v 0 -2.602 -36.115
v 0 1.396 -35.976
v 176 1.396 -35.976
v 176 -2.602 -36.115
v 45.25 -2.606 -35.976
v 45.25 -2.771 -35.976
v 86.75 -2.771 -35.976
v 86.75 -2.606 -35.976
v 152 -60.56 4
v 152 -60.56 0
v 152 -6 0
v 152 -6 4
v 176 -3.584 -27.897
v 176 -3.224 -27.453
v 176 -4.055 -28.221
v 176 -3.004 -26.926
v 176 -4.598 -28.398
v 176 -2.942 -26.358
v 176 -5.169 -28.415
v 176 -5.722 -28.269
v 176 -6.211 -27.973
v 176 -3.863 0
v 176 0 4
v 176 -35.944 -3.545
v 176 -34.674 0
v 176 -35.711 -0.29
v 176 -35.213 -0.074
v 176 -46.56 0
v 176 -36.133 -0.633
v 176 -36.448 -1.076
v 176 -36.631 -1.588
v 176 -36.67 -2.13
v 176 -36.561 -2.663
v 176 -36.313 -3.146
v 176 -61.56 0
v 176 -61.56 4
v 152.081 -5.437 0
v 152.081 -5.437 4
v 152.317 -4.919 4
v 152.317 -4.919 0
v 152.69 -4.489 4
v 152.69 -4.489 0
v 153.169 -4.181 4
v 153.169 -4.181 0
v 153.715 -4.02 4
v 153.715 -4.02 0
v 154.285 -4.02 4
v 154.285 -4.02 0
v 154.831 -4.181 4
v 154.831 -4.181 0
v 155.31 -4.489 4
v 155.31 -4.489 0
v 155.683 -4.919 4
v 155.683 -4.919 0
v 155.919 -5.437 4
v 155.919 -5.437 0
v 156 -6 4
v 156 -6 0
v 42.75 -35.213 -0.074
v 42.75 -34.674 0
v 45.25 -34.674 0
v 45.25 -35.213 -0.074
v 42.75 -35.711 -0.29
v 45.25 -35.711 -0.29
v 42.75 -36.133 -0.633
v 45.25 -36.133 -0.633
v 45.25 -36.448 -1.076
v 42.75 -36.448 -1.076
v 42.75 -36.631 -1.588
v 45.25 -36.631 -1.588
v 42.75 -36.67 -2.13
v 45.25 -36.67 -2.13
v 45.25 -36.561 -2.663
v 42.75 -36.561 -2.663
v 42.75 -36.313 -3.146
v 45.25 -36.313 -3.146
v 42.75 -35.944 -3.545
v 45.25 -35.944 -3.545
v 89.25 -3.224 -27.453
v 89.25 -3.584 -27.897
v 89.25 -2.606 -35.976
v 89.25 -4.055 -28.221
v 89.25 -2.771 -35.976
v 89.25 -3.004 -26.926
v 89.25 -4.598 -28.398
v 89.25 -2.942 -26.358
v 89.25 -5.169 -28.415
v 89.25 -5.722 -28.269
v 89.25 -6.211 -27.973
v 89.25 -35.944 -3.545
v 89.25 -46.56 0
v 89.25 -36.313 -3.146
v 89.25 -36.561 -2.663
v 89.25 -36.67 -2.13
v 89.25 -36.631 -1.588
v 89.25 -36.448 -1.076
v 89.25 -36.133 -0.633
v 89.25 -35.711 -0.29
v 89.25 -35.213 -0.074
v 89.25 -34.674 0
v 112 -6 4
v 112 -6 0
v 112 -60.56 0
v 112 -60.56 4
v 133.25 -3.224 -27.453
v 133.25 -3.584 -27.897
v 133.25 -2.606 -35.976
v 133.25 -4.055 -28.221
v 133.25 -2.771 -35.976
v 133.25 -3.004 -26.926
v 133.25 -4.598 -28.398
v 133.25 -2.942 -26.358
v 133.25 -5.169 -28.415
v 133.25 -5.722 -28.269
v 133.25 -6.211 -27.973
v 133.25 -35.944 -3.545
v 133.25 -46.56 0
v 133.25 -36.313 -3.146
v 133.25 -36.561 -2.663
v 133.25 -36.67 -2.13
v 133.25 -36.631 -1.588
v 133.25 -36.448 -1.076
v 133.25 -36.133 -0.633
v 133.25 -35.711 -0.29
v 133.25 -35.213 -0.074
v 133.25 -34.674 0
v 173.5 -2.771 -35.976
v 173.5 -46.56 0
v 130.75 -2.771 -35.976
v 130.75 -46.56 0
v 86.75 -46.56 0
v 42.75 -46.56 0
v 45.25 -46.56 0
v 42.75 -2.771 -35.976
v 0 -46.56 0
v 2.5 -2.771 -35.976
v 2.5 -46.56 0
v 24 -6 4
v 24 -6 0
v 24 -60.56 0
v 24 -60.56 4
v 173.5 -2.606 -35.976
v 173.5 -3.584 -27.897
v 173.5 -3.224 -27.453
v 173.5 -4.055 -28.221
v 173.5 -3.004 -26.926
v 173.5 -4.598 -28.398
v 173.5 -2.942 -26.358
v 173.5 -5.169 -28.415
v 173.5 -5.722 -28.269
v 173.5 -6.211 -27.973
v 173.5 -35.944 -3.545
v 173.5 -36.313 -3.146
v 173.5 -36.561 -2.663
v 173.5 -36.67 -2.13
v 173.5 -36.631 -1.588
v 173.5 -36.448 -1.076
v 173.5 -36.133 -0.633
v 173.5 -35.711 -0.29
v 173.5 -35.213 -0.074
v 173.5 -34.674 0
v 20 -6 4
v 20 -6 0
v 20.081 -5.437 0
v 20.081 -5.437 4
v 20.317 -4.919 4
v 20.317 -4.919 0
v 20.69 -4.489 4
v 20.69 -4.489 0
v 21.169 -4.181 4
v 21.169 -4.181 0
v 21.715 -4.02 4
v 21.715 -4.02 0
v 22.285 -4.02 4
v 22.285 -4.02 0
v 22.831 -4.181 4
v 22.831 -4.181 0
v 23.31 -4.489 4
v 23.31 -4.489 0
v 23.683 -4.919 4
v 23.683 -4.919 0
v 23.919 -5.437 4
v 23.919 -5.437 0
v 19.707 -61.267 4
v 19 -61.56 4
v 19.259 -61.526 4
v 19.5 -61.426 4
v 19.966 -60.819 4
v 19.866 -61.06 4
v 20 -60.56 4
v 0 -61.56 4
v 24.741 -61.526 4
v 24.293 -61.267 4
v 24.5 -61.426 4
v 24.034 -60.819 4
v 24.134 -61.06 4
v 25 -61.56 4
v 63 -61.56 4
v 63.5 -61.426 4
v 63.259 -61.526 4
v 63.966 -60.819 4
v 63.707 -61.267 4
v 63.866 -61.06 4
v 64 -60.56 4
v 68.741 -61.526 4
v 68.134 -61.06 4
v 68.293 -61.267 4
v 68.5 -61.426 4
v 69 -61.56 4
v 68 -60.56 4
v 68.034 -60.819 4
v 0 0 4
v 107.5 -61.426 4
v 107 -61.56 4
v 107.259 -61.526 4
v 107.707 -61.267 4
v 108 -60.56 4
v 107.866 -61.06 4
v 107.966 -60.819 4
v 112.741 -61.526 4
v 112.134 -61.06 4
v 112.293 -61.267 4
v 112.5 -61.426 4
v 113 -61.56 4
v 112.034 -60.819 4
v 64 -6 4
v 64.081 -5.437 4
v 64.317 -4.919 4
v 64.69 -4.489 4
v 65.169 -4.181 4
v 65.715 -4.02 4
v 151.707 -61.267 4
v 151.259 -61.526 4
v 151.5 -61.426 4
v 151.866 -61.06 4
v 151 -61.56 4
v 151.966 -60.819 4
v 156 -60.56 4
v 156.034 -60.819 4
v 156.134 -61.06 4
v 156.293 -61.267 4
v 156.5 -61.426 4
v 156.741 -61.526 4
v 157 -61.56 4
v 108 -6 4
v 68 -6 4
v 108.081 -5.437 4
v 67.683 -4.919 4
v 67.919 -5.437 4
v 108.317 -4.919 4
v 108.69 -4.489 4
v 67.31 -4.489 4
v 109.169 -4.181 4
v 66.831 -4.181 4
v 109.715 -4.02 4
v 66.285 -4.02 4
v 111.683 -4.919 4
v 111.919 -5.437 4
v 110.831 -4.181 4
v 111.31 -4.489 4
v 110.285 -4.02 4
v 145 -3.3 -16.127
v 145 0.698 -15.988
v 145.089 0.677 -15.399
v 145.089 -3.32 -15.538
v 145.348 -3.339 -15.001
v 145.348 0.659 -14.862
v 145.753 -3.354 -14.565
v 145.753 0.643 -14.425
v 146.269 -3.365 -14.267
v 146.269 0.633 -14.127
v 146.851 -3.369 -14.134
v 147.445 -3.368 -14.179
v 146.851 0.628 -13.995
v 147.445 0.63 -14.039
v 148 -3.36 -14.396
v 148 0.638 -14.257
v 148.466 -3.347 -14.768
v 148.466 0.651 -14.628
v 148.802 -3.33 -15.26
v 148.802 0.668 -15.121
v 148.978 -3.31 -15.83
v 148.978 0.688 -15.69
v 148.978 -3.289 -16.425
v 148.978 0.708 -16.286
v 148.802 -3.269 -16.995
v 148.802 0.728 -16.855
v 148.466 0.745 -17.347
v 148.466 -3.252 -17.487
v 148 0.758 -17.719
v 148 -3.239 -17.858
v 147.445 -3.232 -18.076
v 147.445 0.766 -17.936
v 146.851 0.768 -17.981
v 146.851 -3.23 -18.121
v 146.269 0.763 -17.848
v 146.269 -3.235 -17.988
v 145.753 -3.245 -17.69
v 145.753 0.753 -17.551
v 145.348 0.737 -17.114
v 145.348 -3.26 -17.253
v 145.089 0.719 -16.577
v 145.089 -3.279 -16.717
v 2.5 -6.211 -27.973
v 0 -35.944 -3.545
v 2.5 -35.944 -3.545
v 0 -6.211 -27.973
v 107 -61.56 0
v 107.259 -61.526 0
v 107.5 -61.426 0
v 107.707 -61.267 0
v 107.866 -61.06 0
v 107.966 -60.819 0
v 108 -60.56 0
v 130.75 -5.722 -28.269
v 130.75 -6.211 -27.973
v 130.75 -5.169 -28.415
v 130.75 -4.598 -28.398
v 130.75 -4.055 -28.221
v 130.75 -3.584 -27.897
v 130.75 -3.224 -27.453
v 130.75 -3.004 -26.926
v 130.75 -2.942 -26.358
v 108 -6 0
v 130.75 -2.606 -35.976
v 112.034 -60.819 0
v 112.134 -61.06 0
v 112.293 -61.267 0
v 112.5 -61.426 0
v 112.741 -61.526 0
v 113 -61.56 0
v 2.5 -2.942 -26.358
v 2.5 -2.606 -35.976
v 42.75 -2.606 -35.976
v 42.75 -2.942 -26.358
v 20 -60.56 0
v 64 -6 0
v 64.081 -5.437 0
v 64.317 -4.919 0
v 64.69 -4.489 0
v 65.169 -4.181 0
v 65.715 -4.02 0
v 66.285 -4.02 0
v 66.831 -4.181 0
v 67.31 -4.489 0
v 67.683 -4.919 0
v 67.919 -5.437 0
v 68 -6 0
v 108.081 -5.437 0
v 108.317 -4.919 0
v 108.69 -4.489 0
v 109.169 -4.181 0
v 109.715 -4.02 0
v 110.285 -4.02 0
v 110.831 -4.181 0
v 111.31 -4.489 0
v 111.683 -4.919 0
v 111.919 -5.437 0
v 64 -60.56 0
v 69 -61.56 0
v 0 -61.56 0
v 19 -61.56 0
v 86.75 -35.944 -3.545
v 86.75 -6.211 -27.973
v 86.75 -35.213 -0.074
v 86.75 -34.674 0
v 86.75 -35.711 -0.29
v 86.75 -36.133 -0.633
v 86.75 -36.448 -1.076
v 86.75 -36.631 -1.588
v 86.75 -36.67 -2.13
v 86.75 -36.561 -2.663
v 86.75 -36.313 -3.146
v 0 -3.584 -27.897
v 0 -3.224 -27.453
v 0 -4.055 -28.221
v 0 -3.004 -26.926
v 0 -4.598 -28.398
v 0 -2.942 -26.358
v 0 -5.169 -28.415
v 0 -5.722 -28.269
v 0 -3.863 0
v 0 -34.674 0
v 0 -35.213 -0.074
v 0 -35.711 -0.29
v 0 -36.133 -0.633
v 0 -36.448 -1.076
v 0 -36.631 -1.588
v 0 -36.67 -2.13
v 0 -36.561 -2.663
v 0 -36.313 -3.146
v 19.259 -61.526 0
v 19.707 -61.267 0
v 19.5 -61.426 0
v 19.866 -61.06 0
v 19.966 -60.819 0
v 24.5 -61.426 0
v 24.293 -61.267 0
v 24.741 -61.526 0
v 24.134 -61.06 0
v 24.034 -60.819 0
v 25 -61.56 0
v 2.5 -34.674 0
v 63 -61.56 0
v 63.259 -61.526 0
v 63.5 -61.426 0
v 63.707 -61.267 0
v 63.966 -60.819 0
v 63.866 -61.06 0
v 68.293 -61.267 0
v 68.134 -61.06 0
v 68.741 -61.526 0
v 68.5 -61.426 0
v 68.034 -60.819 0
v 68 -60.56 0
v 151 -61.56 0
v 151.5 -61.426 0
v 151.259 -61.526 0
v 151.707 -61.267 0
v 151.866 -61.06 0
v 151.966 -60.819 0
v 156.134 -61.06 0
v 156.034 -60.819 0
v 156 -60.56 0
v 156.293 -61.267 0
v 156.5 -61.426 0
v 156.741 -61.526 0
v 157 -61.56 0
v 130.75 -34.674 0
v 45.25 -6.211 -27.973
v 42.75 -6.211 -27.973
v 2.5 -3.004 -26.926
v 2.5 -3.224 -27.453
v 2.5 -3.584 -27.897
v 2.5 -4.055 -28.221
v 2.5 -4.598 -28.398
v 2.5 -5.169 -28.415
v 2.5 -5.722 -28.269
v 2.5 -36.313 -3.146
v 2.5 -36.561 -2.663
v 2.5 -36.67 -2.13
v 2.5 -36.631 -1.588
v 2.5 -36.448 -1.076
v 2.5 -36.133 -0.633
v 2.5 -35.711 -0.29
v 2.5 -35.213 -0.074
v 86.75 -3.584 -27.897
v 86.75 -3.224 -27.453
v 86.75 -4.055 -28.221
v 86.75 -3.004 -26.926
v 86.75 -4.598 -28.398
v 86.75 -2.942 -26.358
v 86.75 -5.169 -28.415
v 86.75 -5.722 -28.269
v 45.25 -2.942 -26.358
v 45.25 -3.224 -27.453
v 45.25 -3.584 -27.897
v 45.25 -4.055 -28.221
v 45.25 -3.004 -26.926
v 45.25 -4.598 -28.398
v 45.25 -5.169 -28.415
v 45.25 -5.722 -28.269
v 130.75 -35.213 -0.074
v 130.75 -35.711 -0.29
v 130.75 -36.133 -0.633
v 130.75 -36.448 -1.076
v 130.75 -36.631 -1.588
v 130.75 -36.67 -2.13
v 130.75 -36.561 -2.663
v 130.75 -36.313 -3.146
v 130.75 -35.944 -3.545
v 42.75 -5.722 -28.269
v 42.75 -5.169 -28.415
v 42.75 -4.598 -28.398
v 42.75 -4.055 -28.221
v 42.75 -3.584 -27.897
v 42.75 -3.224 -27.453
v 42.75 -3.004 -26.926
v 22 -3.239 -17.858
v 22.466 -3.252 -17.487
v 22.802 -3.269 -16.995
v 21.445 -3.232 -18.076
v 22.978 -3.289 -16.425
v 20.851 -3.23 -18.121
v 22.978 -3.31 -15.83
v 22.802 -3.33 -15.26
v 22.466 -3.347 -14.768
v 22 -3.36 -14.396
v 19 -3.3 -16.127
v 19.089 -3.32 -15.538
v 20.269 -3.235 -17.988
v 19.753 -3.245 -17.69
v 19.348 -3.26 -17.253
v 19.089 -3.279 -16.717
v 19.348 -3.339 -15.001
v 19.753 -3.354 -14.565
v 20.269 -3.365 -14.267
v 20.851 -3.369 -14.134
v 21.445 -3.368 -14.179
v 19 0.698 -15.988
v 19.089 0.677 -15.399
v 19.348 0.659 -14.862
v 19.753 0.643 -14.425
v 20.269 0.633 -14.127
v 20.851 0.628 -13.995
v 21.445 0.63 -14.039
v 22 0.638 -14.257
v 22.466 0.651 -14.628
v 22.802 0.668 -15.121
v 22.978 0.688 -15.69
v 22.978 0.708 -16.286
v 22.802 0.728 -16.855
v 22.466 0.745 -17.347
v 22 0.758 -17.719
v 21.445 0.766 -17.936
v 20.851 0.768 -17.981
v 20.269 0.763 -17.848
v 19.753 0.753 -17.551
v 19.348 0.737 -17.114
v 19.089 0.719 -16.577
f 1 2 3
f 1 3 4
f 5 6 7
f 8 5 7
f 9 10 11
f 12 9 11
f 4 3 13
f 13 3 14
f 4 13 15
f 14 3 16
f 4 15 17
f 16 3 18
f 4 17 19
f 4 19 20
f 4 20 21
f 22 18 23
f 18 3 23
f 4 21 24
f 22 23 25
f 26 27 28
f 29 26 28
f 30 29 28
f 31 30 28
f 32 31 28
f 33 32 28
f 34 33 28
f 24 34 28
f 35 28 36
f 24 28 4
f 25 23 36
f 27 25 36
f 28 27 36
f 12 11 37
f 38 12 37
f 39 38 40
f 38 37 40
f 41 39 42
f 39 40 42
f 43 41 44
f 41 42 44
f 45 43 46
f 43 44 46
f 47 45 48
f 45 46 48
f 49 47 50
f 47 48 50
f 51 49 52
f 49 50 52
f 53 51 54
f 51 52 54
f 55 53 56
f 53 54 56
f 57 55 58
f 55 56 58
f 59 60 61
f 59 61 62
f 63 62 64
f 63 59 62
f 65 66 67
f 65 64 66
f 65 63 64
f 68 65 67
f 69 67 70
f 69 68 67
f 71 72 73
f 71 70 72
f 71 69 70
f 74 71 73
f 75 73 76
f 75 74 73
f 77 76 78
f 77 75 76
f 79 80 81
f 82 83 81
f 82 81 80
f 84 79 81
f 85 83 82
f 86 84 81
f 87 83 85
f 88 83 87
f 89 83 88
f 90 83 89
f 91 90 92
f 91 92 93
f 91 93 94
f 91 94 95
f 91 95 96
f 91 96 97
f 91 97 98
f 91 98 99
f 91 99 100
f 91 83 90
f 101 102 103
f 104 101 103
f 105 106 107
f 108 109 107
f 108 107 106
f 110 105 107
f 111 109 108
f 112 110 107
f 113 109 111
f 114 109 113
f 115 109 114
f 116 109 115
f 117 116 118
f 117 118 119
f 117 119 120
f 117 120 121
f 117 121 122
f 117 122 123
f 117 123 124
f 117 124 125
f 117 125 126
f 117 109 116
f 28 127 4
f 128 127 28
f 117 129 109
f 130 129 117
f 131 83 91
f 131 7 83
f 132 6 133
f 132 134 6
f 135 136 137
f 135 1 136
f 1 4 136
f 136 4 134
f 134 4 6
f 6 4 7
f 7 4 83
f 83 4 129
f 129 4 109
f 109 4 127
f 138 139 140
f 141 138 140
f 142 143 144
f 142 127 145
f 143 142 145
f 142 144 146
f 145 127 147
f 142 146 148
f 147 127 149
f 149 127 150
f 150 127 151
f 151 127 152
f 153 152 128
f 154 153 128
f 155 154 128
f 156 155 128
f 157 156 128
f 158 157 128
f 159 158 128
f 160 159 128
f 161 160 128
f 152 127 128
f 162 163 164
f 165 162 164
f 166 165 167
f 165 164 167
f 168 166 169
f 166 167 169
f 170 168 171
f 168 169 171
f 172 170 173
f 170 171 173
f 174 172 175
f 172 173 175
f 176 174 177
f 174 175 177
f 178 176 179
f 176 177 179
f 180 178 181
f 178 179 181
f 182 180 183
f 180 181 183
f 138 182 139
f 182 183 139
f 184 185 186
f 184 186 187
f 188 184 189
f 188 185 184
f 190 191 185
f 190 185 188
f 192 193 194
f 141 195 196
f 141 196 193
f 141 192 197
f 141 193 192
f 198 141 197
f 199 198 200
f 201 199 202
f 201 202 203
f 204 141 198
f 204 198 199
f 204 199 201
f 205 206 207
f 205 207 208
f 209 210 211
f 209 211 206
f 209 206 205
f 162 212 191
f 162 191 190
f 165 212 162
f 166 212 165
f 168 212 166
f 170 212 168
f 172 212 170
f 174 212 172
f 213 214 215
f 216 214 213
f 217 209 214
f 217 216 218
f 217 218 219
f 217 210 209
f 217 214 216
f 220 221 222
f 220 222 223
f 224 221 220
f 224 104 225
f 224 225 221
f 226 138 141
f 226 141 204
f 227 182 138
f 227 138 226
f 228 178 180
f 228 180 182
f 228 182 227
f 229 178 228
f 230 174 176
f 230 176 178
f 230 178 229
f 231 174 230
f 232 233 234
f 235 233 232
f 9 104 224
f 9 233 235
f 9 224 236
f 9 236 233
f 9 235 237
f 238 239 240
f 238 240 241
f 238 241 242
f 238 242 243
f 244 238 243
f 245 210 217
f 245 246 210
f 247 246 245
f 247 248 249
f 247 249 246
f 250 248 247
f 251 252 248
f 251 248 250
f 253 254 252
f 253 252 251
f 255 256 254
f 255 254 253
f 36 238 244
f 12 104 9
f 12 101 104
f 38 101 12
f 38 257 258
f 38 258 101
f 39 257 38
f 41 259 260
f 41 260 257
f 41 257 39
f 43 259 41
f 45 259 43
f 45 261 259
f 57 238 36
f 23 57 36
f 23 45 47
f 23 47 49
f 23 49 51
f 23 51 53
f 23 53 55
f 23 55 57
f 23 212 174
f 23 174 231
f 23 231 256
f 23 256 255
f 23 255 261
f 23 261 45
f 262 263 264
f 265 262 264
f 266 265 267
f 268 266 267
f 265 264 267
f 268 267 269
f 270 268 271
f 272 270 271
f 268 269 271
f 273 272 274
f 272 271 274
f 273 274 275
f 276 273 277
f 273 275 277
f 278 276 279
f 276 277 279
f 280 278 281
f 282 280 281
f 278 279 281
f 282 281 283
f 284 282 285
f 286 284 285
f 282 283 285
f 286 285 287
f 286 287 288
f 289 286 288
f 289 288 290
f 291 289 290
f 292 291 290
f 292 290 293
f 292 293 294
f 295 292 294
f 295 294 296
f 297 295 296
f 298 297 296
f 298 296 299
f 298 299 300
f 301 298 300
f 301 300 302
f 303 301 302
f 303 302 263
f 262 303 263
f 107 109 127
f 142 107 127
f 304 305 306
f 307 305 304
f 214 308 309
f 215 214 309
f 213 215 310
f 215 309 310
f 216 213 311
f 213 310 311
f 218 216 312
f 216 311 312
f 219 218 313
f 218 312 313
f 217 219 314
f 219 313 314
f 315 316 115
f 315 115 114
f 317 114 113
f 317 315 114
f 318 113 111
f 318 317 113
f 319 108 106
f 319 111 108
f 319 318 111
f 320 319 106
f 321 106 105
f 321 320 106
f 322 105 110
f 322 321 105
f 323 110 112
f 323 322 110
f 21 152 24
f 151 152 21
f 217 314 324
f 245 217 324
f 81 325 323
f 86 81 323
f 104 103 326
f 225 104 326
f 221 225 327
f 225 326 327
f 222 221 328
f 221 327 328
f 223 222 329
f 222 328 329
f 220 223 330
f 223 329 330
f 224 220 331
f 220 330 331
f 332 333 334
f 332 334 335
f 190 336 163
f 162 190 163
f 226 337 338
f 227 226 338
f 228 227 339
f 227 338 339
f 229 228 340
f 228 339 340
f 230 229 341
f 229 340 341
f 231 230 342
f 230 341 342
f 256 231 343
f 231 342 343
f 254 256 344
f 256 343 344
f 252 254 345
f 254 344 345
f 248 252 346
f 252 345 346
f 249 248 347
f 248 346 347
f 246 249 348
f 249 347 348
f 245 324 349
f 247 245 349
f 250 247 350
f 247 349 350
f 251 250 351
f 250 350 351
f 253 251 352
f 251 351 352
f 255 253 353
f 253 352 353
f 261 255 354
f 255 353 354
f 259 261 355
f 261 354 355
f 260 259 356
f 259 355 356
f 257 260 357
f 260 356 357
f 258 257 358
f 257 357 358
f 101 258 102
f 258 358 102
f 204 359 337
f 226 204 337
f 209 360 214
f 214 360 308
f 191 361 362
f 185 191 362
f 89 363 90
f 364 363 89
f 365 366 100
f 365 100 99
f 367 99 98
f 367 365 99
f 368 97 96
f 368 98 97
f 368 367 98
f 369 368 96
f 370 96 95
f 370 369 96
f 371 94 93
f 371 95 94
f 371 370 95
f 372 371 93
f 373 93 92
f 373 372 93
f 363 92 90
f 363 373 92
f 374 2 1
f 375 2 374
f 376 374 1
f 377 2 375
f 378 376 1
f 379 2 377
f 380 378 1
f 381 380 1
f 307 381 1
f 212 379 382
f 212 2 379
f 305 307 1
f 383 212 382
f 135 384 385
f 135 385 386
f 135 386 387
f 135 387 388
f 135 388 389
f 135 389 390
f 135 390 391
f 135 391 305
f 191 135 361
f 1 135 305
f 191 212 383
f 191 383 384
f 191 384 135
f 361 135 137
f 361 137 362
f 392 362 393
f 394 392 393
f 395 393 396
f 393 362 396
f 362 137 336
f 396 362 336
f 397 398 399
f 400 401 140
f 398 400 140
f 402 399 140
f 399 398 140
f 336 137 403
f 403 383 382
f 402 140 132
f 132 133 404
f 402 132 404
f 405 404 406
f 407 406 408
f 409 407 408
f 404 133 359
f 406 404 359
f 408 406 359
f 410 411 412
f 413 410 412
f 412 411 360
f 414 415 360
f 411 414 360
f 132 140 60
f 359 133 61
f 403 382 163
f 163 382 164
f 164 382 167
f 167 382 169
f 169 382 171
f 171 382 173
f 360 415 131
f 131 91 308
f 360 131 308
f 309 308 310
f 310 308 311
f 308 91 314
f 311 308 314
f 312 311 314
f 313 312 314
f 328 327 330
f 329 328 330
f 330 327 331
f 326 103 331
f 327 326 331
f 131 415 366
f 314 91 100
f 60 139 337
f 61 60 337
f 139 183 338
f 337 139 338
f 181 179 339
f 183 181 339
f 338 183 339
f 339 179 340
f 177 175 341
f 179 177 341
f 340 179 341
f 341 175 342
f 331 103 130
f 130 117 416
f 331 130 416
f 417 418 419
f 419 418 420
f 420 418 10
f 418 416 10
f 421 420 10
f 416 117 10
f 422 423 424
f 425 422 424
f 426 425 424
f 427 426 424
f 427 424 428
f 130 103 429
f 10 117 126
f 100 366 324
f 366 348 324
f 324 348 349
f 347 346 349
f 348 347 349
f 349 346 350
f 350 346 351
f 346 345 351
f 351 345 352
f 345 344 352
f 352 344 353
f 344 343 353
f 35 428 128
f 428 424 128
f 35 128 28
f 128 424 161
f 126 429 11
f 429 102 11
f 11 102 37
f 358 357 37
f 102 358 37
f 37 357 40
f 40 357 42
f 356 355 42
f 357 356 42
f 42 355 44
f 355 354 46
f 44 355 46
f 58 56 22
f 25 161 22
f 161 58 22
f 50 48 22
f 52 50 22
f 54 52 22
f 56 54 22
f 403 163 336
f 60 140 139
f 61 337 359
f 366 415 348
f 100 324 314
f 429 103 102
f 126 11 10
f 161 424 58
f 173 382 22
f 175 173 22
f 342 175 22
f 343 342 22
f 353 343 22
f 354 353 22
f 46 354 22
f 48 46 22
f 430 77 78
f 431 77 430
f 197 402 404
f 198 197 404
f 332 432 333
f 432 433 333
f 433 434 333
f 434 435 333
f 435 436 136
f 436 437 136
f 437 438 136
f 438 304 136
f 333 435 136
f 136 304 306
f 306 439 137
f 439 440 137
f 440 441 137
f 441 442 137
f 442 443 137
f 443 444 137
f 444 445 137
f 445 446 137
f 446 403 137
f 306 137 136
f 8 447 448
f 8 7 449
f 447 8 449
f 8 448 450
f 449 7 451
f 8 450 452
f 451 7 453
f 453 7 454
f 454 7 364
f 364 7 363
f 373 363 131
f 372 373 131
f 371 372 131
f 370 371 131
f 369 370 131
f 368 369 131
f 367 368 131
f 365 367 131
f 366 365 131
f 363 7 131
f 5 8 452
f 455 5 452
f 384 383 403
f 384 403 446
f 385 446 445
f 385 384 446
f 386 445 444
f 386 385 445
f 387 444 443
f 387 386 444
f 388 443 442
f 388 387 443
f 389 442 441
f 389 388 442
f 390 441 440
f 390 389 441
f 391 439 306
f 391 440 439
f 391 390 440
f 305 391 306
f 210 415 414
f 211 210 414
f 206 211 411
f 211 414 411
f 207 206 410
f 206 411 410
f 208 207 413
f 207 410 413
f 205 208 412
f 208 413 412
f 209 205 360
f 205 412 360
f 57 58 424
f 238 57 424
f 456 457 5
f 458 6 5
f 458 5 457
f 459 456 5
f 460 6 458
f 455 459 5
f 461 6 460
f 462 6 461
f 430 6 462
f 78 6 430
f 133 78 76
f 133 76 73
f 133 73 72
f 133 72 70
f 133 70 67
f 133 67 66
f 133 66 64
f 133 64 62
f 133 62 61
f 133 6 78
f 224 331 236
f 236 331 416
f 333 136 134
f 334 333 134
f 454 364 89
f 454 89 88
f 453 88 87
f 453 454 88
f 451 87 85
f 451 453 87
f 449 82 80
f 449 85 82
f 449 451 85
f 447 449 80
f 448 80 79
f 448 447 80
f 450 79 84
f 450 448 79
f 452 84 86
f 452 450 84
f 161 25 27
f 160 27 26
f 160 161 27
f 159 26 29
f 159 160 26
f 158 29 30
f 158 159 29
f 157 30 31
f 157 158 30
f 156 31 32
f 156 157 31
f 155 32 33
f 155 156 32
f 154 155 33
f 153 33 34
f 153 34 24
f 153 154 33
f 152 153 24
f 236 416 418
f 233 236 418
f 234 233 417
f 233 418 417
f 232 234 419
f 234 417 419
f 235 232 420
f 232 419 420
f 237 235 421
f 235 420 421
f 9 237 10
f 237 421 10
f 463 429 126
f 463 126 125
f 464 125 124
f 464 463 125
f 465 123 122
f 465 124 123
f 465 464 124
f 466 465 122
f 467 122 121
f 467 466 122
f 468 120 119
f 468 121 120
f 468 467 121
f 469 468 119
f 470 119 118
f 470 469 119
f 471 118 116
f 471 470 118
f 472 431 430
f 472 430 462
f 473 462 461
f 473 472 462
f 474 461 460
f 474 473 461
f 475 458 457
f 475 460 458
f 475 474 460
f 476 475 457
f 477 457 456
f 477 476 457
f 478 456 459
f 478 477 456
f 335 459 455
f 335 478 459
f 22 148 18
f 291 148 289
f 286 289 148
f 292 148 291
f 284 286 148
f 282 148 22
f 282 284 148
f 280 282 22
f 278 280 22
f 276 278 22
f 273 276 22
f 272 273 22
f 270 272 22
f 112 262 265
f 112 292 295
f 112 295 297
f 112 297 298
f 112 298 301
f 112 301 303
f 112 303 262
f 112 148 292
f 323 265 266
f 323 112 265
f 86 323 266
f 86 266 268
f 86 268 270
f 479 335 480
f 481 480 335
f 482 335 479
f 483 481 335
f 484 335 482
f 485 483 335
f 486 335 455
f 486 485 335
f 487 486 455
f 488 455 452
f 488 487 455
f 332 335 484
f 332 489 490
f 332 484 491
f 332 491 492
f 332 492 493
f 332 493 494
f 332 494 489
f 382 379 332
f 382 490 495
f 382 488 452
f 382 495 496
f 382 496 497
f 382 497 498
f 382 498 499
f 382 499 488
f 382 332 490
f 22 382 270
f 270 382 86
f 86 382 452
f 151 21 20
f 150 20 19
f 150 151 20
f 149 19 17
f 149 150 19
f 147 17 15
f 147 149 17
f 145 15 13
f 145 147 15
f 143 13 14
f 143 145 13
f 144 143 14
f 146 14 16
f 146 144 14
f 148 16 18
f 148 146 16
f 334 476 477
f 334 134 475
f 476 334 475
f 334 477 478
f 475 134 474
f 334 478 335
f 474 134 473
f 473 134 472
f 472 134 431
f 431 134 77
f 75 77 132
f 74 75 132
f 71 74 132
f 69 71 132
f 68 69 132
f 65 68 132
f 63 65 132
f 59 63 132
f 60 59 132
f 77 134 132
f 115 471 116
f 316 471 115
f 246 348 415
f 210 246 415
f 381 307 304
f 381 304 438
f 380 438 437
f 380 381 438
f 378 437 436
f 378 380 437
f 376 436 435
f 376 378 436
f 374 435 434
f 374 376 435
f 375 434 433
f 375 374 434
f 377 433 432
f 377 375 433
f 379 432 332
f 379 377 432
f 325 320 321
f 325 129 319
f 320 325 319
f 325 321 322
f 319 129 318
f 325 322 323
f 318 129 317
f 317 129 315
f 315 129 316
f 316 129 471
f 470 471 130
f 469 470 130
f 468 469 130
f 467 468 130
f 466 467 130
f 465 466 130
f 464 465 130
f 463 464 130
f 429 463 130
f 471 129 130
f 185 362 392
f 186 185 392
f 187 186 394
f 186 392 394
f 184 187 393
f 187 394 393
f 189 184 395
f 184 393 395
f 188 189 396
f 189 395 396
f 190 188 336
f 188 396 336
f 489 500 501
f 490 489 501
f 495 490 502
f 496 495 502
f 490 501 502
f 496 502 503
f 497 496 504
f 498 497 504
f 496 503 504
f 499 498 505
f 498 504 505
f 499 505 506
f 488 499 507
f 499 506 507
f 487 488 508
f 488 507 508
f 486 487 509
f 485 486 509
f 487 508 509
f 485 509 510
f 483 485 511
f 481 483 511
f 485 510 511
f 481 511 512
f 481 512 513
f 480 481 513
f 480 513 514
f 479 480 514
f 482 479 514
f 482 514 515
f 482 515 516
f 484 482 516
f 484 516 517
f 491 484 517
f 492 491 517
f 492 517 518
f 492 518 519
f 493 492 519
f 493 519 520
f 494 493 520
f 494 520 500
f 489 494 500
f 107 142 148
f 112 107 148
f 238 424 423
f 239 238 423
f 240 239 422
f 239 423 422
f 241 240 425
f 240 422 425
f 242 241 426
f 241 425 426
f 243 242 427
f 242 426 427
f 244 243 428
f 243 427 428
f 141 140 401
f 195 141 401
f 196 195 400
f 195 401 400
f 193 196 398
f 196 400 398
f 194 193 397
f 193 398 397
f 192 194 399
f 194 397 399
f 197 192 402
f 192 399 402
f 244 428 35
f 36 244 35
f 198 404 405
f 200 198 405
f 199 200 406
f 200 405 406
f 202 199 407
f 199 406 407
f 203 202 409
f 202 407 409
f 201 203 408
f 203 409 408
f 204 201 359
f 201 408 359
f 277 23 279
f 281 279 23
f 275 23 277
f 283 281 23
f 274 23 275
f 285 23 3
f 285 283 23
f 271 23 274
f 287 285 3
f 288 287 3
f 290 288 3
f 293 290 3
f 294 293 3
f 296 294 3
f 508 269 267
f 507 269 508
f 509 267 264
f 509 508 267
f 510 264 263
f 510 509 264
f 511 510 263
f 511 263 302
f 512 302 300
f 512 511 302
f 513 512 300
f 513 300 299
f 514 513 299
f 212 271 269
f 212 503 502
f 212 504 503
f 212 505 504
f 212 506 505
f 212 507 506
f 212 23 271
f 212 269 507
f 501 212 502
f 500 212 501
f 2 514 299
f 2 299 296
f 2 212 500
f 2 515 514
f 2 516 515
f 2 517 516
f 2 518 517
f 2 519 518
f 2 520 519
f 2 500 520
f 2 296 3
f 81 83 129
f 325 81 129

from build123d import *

# Parameters (mm, degrees)
F1_DEPTH = 4
F4_DEPTH = 176
F6_W     = 40.25
F6_H     = 35.9756330808
F6_W_2   = 41.5
F7_REACH = 113.8761797882
F8_R     = 2
F9_DEPTH = 25


# Not quite as in the source:
# - a feature names something its author has since deleted; it is built from what else it names


with BuildPart() as f1:
    # F0 (on Top) → F1 (new body)
    with BuildSketch(Plane.XY):
        with BuildLine():
            Line((176, 0), (0, 0))
            Line((0, 0), (0, -61.56))
            Line((0, -61.56), (19, -61.56))
            ThreePointArc((19, -61.56), (19.7071067812, -61.2671067812), (20, -60.56))
            Line((20, -60.56), (20, -6))
            ThreePointArc((20, -6), (22, -4), (24, -6))
            Line((24, -6), (24, -60.56))
            ThreePointArc((24, -60.56), (24.2928932188, -61.2671067812), (25, -61.56))
            Line((25, -61.56), (63, -61.56))
            ThreePointArc((63, -61.56), (63.7071067812, -61.2671067812), (64, -60.56))
            Line((64, -60.56), (64, -6))
            ThreePointArc((64, -6), (66, -4), (68, -6))
            Line((68, -6), (68, -60.56))
            ThreePointArc((68, -60.56), (68.2928932188, -61.2671067812), (69, -61.56))
            Line((69, -61.56), (107, -61.56))
            ThreePointArc((107, -61.56), (107.7071067812, -61.2671067812), (108, -60.56))
            Line((108, -60.56), (108, -6))
            ThreePointArc((108, -6), (110, -4), (112, -6))
            Line((112, -6), (112, -60.56))
            ThreePointArc((112, -60.56), (112.2928932188, -61.2671067812), (113, -61.56))
            Line((113, -61.56), (151, -61.56))
            ThreePointArc((151, -61.56), (151.7071067812, -61.2671067812), (152, -60.56))
            Line((152, -60.56), (152, -6))
            ThreePointArc((152, -6), (154, -4), (156, -6))
            Line((156, -6), (156, -60.56))
            ThreePointArc((156, -60.56), (156.2928932188, -61.2671067812), (157, -61.56))
            Line((157, -61.56), (176, -61.56))
            Line((176, -61.56), (176, 0))
        make_face()
    extrude(amount=F1_DEPTH)

    # F3 (on face) → F4 (join, through all)
    with BuildSketch(Plane(origin=(0, 0, 0), x_dir=(0, -1, 0), z_dir=(-1, 0, 0))):
        with BuildLine():
            Line((2.9423112754, -26.3580624732), (3.8627550992, 0))
            Line((3.8627550992, 0), (0, 0))
            Line((0, 0), (0, 4))
            Line((0, 4), (-1.3959798681, -35.9756330808))
            Line((-1.3959798681, -35.9756330808), (2.60158344, -36.1152310676))
            Line((2.60158344, -36.1152310676), (46.56, 0))
            Line((46.56, 0), (34.6739806412, 0))
            ThreePointArc((34.6739806412, 0), (36.5568879354, -1.3257151036), (35.9435965909, -3.5453398785))
            Line((35.9435965909, -3.5453398785), (6.2107088791, -27.9732013451))
            ThreePointArc((6.2107088791, -27.9732013451), (4.0550404197, -28.220878742), (2.9423112754, -26.3580624732))
        make_face()
    extrude(amount=-F4_DEPTH)

    f7_end = Plane(origin=(88, -3.299573374, -16.1274145272), x_dir=(0, -0.0348994967, 0.999390827), z_dir=(0, 0.999390827, 0.0348994967))
    # F6 (on face) → F7 (cut, up to a plane its end follows)
    with BuildSketch(Plane.XZ.offset(61.56)):
        with Locations((153.375, -17.9878165404)):
            Rectangle(F6_W, F6_H)
        with Locations((110, -17.9878165404)):
            Rectangle(F6_W_2, F6_H)
        with Locations((66, -17.9878165404)):
            Rectangle(F6_W_2, F6_H)
        Polygon((19, 0), (2.5, 0), (2.5, -35.9756330808), (42.75, -35.9756330808), (42.75, 0), align=None)
    f7_long = extrude(amount=-F7_REACH, mode=Mode.PRIVATE)
    add(split(f7_long, bisect_by=f7_end, keep=Keep.BOTTOM, mode=Mode.PRIVATE), mode=Mode.SUBTRACT)

    # F8 (on face) → F9 (cut)
    with BuildSketch(Plane(origin=(0, 0.1395129475, 0.0048718995), x_dir=(-1, 0, 0), z_dir=(0, 0.999390827, 0.0348994967))):
        with Locations((-147.0000000001, -16.0024366919)):
            Circle(F8_R)
        with Locations((-21, -16.0024366919)):
            Circle(F8_R)
    extrude(amount=-F9_DEPTH, mode=Mode.SUBTRACT)


solid = f1.part
